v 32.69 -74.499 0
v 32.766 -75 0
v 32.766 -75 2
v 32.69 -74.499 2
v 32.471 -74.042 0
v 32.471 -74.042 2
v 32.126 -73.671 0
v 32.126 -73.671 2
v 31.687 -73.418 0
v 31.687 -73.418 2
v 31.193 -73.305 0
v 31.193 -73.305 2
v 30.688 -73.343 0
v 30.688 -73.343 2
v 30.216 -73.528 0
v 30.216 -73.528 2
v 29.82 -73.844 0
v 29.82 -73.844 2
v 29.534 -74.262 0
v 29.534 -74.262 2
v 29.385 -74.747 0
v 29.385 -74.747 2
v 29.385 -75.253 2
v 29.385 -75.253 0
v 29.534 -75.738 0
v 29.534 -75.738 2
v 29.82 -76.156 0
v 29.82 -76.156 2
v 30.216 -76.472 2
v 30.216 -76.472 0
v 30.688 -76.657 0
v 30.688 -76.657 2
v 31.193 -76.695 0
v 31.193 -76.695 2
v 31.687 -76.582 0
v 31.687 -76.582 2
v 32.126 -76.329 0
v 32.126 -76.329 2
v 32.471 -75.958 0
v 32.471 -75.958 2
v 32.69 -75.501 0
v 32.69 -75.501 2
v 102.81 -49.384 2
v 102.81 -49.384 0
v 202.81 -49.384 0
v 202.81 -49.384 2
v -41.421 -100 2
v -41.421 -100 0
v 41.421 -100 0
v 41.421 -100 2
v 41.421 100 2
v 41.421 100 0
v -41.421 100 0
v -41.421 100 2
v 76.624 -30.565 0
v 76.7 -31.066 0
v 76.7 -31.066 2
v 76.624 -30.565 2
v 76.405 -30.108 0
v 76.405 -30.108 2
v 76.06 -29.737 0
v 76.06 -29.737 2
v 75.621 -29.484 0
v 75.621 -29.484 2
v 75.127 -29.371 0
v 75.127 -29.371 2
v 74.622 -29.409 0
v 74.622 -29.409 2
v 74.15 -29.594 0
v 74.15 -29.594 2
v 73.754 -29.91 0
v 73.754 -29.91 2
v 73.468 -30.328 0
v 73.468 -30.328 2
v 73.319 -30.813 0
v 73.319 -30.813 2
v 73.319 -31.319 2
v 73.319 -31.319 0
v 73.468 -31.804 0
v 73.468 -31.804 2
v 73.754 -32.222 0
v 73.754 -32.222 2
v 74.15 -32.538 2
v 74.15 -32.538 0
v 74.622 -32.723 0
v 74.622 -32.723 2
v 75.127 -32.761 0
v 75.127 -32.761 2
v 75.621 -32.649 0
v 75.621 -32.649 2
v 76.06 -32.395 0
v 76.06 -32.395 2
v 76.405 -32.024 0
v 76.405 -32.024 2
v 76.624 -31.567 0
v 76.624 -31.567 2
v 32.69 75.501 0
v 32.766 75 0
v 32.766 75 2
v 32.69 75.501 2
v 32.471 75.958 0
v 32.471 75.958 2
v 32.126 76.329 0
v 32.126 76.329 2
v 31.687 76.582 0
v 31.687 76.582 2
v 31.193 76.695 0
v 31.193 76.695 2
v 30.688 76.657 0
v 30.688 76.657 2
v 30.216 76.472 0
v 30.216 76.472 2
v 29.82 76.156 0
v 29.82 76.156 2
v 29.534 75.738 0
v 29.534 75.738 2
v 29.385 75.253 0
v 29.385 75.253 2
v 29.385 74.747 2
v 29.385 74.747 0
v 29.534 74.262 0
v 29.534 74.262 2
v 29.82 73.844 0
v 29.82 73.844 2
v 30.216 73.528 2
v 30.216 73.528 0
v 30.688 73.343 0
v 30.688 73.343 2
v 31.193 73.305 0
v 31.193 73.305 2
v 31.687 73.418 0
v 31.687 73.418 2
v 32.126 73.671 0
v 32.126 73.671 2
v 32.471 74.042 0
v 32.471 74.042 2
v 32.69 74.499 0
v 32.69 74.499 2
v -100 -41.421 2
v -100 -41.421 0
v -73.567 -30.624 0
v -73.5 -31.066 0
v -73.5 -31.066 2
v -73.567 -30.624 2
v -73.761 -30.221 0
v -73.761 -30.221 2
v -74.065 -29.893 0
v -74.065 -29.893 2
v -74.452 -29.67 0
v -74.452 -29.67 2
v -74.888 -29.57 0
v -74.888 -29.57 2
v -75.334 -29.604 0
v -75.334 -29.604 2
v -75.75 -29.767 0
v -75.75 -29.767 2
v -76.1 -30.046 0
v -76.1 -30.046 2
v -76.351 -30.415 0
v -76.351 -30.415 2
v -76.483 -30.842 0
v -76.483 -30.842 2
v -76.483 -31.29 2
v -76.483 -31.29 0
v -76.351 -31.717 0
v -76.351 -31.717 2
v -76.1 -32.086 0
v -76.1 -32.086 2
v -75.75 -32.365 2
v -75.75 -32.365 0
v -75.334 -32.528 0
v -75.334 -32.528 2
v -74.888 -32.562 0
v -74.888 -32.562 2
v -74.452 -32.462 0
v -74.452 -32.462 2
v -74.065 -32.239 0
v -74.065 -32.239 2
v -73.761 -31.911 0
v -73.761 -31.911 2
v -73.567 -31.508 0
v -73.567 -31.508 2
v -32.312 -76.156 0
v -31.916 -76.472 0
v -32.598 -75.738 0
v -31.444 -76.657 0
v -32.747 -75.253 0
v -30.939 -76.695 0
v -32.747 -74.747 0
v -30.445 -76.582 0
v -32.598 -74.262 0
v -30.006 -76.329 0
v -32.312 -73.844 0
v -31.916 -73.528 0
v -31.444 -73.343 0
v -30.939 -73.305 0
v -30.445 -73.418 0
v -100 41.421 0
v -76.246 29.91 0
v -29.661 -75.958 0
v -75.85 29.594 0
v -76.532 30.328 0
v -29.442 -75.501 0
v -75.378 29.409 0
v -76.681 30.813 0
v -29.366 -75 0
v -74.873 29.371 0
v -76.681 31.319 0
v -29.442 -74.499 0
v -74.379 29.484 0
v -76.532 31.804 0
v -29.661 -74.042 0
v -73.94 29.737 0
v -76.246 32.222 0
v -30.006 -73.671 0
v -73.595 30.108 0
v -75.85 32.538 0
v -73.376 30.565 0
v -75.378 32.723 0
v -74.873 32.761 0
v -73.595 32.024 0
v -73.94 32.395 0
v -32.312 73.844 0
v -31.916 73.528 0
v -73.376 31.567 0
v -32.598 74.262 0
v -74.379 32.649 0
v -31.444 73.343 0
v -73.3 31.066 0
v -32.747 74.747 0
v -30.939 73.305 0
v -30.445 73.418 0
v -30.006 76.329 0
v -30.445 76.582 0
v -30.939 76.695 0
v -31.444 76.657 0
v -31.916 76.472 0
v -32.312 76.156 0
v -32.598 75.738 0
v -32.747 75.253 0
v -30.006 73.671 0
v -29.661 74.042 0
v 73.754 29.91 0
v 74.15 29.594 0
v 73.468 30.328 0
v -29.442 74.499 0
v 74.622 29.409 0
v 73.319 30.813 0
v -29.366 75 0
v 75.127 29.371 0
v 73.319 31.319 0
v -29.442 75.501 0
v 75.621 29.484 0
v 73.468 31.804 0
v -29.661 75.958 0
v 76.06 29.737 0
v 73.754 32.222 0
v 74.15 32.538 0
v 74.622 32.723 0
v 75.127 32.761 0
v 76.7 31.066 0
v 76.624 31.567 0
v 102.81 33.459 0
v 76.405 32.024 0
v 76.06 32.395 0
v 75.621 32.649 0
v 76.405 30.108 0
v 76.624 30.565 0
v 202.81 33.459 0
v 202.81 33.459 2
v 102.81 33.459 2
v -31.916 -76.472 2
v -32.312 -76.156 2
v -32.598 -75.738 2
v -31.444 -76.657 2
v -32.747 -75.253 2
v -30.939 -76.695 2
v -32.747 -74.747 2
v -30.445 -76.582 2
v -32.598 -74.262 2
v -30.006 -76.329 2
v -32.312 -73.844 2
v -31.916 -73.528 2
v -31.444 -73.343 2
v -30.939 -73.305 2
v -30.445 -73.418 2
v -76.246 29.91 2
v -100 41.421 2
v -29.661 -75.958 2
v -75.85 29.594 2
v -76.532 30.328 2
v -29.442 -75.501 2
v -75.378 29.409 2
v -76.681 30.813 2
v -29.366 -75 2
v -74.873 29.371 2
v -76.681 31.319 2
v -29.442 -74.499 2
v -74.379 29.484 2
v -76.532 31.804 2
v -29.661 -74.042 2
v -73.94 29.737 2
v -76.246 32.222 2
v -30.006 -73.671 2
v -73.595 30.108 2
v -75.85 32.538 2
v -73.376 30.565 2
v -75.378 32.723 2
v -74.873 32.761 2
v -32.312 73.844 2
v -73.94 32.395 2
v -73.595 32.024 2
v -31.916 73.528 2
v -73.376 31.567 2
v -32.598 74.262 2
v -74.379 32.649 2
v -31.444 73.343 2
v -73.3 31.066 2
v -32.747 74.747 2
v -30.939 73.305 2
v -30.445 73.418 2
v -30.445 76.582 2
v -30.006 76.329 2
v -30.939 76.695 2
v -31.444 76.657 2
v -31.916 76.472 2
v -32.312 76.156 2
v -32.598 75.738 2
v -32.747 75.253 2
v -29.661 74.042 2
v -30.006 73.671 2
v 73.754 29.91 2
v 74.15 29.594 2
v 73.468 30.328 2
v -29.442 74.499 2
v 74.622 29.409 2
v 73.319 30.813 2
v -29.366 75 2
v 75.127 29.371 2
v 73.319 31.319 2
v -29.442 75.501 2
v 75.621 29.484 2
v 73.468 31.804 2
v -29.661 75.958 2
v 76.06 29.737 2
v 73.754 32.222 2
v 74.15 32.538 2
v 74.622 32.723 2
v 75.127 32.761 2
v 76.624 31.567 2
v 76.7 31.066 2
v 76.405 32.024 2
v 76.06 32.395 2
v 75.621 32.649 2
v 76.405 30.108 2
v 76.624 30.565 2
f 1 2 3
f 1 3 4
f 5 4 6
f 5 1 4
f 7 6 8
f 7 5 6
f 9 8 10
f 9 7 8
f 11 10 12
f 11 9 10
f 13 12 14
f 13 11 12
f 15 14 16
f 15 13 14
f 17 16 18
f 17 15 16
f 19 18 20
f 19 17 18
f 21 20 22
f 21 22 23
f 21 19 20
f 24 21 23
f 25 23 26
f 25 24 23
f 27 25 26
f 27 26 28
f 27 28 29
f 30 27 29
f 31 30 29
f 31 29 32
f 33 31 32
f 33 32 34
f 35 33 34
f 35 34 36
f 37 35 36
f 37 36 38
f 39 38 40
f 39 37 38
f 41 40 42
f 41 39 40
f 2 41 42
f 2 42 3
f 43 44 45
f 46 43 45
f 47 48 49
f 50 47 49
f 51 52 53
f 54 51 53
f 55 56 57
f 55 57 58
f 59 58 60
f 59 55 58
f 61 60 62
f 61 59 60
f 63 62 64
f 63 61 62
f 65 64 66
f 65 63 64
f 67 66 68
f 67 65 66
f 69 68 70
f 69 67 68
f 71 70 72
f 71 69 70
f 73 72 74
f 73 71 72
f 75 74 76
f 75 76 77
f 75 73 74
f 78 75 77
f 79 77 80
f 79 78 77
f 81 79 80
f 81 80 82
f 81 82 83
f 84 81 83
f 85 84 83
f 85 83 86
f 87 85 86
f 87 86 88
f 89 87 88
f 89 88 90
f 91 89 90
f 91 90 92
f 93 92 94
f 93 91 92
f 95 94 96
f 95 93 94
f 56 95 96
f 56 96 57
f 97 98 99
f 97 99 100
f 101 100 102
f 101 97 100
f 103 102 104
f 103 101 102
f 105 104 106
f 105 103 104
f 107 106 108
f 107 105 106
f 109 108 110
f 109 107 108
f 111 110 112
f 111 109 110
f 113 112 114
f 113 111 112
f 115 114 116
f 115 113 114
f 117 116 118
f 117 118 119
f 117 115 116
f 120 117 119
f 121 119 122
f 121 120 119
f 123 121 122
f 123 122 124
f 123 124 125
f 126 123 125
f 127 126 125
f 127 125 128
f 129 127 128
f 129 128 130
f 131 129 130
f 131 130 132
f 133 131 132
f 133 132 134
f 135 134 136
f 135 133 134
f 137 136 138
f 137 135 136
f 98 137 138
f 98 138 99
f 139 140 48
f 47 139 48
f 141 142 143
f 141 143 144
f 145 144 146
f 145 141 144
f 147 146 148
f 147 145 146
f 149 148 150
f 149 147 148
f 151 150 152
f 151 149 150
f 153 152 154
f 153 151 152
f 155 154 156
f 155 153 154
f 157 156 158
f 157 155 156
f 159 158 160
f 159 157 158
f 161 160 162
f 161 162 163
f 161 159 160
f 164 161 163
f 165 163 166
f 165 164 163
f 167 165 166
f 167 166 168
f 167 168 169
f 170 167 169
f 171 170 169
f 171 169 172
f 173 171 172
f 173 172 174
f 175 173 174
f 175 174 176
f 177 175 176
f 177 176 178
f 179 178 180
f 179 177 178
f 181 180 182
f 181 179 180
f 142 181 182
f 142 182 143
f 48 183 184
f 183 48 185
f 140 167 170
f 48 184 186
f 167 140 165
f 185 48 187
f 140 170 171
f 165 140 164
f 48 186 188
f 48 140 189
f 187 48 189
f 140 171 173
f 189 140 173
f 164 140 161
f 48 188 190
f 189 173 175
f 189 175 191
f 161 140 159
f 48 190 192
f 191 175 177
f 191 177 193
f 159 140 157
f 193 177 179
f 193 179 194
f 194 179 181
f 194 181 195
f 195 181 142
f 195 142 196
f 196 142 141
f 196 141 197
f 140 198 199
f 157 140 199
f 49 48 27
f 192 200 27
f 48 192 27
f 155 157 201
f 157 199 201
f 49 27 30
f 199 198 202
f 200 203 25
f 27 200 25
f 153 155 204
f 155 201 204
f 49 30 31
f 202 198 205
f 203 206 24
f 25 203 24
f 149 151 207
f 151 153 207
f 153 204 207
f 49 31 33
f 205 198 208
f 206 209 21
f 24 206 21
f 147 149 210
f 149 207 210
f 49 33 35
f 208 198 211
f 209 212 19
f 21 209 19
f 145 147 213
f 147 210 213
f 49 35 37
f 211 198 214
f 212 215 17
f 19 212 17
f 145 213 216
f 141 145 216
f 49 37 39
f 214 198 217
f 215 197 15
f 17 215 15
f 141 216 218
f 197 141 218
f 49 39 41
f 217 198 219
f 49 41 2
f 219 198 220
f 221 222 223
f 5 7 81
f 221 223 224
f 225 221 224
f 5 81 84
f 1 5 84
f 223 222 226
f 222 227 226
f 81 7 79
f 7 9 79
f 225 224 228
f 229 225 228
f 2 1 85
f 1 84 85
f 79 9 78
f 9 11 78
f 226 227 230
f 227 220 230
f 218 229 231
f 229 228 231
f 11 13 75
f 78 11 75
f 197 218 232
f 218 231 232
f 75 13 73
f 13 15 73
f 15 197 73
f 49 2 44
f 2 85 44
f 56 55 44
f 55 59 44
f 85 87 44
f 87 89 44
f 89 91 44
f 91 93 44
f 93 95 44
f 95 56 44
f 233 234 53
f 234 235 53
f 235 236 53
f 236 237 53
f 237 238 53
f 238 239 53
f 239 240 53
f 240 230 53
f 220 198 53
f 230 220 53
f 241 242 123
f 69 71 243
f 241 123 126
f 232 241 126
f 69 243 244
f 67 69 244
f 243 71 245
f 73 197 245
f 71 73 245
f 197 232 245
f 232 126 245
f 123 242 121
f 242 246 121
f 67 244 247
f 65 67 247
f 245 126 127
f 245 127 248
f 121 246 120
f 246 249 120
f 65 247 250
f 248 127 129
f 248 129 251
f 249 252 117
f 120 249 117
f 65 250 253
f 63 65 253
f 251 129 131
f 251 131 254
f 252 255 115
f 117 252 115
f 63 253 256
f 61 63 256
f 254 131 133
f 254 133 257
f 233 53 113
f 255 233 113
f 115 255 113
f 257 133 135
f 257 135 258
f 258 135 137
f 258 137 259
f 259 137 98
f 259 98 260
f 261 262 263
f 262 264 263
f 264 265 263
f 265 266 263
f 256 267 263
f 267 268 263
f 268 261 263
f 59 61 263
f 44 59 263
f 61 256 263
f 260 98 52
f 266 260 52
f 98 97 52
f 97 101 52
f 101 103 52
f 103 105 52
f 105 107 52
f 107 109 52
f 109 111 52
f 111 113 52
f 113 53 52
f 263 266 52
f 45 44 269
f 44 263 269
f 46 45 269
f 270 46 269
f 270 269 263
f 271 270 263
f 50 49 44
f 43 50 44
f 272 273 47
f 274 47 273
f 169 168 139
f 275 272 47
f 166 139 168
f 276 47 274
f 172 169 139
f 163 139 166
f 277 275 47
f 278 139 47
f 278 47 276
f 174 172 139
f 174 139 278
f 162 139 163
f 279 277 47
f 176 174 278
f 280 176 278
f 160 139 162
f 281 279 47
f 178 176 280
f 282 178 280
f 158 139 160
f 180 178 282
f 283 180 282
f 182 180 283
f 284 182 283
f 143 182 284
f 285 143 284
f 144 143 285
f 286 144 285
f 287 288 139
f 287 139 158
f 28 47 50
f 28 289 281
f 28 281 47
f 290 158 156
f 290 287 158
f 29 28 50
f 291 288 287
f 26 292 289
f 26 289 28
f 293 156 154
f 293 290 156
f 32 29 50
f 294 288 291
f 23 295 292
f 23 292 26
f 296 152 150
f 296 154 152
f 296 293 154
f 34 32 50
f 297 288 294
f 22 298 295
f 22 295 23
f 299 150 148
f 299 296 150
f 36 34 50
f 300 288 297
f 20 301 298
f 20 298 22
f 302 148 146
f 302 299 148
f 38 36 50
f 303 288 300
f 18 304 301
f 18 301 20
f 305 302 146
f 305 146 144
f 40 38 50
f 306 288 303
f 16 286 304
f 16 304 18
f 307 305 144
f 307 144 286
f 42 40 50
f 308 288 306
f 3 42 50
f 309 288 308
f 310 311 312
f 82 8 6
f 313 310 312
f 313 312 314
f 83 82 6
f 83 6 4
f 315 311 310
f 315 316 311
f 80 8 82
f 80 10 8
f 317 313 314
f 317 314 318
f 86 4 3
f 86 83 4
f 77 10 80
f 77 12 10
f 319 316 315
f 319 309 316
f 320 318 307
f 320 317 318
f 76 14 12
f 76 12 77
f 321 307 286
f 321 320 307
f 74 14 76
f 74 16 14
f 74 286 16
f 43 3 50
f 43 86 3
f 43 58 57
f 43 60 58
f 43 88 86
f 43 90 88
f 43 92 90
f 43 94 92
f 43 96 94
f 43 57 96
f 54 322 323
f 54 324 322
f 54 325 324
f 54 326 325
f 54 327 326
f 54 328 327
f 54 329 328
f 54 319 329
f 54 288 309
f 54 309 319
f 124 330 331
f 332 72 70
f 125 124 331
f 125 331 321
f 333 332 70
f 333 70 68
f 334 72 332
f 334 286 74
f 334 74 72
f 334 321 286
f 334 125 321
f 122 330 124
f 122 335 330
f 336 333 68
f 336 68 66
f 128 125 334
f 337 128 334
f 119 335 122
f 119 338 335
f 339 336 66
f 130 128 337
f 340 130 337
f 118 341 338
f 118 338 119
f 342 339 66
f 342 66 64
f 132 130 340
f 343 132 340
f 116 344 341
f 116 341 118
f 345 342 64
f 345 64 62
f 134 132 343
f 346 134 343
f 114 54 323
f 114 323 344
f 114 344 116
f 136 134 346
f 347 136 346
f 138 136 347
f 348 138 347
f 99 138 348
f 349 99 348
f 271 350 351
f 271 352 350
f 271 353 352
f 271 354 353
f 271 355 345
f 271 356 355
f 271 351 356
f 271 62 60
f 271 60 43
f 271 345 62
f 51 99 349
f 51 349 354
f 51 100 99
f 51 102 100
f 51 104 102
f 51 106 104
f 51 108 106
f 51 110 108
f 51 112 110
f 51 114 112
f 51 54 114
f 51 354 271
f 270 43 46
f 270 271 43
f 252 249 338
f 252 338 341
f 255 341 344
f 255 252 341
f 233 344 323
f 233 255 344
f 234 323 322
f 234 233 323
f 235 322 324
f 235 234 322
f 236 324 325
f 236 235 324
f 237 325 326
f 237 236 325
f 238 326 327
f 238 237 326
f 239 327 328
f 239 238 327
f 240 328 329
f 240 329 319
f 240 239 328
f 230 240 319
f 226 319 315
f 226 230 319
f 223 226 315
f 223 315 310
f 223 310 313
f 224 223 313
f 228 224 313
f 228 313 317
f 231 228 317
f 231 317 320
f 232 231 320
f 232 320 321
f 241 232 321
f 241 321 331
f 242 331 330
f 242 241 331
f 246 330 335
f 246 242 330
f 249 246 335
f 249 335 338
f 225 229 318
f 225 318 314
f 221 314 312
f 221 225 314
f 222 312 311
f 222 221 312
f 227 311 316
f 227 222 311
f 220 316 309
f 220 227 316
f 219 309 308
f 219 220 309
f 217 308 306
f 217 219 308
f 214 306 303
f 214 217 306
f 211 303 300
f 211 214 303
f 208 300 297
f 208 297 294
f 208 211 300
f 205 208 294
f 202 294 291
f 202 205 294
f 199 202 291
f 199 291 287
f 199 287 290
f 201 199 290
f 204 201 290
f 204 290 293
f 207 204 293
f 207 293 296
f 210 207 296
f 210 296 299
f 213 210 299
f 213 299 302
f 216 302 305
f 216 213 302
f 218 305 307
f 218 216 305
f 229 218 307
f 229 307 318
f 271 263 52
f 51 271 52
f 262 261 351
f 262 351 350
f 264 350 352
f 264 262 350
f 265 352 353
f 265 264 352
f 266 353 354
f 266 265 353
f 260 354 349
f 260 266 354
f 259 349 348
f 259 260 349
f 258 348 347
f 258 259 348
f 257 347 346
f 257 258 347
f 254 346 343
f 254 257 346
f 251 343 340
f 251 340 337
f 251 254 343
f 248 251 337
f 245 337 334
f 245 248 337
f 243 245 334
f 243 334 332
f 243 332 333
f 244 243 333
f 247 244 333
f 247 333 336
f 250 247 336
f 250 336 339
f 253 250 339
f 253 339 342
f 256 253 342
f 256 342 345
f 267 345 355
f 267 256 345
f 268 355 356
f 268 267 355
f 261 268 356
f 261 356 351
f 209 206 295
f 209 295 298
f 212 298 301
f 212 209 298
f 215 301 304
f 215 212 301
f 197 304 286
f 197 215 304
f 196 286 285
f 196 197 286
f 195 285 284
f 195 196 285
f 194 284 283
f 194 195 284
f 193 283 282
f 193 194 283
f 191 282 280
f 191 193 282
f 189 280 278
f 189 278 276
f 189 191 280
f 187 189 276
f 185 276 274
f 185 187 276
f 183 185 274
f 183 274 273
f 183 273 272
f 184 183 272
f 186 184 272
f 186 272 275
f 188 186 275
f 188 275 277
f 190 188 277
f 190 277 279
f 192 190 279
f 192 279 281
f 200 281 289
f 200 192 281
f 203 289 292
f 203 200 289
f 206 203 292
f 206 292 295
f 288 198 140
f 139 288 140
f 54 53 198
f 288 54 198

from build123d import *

# Parameters (mm, degrees)
F0_R     = 1.7
F0_R_2   = 1.5
F1_DEPTH = 2


with BuildPart() as f1:
    # F0 (on Top) → F1 (new body)
    with BuildSketch(Plane.XY):
        Polygon((41.421356, 100), (-41.421356, 100), (-100, 41.421356), (-100, -41.421356), (-41.421356, -100), (41.421356, -100), (102.809891, -49.384143), (202.809891, -49.384143), (202.809891, 33.458857), (102.809891, 33.458857), align=None)
        with Locations((-31.066017, -75)):
            Circle(F0_R, mode=Mode.SUBTRACT)
        with Locations((31.066017, -75)):
            Circle(F0_R, mode=Mode.SUBTRACT)
        with Locations((-75, -31.066017)):
            Circle(F0_R_2, mode=Mode.SUBTRACT)
        with Locations((75, -31.066017)):
            Circle(F0_R, mode=Mode.SUBTRACT)
        with Locations((-75, 31.066017)):
            Circle(F0_R, mode=Mode.SUBTRACT)
        with Locations((-31.066017, 75)):
            Circle(F0_R, mode=Mode.SUBTRACT)
        with Locations((31.066017, 75)):
            Circle(F0_R, mode=Mode.SUBTRACT)
        with Locations((75, 31.066017)):
            Circle(F0_R, mode=Mode.SUBTRACT)
    extrude(amount=F1_DEPTH)


solid = f1.part
